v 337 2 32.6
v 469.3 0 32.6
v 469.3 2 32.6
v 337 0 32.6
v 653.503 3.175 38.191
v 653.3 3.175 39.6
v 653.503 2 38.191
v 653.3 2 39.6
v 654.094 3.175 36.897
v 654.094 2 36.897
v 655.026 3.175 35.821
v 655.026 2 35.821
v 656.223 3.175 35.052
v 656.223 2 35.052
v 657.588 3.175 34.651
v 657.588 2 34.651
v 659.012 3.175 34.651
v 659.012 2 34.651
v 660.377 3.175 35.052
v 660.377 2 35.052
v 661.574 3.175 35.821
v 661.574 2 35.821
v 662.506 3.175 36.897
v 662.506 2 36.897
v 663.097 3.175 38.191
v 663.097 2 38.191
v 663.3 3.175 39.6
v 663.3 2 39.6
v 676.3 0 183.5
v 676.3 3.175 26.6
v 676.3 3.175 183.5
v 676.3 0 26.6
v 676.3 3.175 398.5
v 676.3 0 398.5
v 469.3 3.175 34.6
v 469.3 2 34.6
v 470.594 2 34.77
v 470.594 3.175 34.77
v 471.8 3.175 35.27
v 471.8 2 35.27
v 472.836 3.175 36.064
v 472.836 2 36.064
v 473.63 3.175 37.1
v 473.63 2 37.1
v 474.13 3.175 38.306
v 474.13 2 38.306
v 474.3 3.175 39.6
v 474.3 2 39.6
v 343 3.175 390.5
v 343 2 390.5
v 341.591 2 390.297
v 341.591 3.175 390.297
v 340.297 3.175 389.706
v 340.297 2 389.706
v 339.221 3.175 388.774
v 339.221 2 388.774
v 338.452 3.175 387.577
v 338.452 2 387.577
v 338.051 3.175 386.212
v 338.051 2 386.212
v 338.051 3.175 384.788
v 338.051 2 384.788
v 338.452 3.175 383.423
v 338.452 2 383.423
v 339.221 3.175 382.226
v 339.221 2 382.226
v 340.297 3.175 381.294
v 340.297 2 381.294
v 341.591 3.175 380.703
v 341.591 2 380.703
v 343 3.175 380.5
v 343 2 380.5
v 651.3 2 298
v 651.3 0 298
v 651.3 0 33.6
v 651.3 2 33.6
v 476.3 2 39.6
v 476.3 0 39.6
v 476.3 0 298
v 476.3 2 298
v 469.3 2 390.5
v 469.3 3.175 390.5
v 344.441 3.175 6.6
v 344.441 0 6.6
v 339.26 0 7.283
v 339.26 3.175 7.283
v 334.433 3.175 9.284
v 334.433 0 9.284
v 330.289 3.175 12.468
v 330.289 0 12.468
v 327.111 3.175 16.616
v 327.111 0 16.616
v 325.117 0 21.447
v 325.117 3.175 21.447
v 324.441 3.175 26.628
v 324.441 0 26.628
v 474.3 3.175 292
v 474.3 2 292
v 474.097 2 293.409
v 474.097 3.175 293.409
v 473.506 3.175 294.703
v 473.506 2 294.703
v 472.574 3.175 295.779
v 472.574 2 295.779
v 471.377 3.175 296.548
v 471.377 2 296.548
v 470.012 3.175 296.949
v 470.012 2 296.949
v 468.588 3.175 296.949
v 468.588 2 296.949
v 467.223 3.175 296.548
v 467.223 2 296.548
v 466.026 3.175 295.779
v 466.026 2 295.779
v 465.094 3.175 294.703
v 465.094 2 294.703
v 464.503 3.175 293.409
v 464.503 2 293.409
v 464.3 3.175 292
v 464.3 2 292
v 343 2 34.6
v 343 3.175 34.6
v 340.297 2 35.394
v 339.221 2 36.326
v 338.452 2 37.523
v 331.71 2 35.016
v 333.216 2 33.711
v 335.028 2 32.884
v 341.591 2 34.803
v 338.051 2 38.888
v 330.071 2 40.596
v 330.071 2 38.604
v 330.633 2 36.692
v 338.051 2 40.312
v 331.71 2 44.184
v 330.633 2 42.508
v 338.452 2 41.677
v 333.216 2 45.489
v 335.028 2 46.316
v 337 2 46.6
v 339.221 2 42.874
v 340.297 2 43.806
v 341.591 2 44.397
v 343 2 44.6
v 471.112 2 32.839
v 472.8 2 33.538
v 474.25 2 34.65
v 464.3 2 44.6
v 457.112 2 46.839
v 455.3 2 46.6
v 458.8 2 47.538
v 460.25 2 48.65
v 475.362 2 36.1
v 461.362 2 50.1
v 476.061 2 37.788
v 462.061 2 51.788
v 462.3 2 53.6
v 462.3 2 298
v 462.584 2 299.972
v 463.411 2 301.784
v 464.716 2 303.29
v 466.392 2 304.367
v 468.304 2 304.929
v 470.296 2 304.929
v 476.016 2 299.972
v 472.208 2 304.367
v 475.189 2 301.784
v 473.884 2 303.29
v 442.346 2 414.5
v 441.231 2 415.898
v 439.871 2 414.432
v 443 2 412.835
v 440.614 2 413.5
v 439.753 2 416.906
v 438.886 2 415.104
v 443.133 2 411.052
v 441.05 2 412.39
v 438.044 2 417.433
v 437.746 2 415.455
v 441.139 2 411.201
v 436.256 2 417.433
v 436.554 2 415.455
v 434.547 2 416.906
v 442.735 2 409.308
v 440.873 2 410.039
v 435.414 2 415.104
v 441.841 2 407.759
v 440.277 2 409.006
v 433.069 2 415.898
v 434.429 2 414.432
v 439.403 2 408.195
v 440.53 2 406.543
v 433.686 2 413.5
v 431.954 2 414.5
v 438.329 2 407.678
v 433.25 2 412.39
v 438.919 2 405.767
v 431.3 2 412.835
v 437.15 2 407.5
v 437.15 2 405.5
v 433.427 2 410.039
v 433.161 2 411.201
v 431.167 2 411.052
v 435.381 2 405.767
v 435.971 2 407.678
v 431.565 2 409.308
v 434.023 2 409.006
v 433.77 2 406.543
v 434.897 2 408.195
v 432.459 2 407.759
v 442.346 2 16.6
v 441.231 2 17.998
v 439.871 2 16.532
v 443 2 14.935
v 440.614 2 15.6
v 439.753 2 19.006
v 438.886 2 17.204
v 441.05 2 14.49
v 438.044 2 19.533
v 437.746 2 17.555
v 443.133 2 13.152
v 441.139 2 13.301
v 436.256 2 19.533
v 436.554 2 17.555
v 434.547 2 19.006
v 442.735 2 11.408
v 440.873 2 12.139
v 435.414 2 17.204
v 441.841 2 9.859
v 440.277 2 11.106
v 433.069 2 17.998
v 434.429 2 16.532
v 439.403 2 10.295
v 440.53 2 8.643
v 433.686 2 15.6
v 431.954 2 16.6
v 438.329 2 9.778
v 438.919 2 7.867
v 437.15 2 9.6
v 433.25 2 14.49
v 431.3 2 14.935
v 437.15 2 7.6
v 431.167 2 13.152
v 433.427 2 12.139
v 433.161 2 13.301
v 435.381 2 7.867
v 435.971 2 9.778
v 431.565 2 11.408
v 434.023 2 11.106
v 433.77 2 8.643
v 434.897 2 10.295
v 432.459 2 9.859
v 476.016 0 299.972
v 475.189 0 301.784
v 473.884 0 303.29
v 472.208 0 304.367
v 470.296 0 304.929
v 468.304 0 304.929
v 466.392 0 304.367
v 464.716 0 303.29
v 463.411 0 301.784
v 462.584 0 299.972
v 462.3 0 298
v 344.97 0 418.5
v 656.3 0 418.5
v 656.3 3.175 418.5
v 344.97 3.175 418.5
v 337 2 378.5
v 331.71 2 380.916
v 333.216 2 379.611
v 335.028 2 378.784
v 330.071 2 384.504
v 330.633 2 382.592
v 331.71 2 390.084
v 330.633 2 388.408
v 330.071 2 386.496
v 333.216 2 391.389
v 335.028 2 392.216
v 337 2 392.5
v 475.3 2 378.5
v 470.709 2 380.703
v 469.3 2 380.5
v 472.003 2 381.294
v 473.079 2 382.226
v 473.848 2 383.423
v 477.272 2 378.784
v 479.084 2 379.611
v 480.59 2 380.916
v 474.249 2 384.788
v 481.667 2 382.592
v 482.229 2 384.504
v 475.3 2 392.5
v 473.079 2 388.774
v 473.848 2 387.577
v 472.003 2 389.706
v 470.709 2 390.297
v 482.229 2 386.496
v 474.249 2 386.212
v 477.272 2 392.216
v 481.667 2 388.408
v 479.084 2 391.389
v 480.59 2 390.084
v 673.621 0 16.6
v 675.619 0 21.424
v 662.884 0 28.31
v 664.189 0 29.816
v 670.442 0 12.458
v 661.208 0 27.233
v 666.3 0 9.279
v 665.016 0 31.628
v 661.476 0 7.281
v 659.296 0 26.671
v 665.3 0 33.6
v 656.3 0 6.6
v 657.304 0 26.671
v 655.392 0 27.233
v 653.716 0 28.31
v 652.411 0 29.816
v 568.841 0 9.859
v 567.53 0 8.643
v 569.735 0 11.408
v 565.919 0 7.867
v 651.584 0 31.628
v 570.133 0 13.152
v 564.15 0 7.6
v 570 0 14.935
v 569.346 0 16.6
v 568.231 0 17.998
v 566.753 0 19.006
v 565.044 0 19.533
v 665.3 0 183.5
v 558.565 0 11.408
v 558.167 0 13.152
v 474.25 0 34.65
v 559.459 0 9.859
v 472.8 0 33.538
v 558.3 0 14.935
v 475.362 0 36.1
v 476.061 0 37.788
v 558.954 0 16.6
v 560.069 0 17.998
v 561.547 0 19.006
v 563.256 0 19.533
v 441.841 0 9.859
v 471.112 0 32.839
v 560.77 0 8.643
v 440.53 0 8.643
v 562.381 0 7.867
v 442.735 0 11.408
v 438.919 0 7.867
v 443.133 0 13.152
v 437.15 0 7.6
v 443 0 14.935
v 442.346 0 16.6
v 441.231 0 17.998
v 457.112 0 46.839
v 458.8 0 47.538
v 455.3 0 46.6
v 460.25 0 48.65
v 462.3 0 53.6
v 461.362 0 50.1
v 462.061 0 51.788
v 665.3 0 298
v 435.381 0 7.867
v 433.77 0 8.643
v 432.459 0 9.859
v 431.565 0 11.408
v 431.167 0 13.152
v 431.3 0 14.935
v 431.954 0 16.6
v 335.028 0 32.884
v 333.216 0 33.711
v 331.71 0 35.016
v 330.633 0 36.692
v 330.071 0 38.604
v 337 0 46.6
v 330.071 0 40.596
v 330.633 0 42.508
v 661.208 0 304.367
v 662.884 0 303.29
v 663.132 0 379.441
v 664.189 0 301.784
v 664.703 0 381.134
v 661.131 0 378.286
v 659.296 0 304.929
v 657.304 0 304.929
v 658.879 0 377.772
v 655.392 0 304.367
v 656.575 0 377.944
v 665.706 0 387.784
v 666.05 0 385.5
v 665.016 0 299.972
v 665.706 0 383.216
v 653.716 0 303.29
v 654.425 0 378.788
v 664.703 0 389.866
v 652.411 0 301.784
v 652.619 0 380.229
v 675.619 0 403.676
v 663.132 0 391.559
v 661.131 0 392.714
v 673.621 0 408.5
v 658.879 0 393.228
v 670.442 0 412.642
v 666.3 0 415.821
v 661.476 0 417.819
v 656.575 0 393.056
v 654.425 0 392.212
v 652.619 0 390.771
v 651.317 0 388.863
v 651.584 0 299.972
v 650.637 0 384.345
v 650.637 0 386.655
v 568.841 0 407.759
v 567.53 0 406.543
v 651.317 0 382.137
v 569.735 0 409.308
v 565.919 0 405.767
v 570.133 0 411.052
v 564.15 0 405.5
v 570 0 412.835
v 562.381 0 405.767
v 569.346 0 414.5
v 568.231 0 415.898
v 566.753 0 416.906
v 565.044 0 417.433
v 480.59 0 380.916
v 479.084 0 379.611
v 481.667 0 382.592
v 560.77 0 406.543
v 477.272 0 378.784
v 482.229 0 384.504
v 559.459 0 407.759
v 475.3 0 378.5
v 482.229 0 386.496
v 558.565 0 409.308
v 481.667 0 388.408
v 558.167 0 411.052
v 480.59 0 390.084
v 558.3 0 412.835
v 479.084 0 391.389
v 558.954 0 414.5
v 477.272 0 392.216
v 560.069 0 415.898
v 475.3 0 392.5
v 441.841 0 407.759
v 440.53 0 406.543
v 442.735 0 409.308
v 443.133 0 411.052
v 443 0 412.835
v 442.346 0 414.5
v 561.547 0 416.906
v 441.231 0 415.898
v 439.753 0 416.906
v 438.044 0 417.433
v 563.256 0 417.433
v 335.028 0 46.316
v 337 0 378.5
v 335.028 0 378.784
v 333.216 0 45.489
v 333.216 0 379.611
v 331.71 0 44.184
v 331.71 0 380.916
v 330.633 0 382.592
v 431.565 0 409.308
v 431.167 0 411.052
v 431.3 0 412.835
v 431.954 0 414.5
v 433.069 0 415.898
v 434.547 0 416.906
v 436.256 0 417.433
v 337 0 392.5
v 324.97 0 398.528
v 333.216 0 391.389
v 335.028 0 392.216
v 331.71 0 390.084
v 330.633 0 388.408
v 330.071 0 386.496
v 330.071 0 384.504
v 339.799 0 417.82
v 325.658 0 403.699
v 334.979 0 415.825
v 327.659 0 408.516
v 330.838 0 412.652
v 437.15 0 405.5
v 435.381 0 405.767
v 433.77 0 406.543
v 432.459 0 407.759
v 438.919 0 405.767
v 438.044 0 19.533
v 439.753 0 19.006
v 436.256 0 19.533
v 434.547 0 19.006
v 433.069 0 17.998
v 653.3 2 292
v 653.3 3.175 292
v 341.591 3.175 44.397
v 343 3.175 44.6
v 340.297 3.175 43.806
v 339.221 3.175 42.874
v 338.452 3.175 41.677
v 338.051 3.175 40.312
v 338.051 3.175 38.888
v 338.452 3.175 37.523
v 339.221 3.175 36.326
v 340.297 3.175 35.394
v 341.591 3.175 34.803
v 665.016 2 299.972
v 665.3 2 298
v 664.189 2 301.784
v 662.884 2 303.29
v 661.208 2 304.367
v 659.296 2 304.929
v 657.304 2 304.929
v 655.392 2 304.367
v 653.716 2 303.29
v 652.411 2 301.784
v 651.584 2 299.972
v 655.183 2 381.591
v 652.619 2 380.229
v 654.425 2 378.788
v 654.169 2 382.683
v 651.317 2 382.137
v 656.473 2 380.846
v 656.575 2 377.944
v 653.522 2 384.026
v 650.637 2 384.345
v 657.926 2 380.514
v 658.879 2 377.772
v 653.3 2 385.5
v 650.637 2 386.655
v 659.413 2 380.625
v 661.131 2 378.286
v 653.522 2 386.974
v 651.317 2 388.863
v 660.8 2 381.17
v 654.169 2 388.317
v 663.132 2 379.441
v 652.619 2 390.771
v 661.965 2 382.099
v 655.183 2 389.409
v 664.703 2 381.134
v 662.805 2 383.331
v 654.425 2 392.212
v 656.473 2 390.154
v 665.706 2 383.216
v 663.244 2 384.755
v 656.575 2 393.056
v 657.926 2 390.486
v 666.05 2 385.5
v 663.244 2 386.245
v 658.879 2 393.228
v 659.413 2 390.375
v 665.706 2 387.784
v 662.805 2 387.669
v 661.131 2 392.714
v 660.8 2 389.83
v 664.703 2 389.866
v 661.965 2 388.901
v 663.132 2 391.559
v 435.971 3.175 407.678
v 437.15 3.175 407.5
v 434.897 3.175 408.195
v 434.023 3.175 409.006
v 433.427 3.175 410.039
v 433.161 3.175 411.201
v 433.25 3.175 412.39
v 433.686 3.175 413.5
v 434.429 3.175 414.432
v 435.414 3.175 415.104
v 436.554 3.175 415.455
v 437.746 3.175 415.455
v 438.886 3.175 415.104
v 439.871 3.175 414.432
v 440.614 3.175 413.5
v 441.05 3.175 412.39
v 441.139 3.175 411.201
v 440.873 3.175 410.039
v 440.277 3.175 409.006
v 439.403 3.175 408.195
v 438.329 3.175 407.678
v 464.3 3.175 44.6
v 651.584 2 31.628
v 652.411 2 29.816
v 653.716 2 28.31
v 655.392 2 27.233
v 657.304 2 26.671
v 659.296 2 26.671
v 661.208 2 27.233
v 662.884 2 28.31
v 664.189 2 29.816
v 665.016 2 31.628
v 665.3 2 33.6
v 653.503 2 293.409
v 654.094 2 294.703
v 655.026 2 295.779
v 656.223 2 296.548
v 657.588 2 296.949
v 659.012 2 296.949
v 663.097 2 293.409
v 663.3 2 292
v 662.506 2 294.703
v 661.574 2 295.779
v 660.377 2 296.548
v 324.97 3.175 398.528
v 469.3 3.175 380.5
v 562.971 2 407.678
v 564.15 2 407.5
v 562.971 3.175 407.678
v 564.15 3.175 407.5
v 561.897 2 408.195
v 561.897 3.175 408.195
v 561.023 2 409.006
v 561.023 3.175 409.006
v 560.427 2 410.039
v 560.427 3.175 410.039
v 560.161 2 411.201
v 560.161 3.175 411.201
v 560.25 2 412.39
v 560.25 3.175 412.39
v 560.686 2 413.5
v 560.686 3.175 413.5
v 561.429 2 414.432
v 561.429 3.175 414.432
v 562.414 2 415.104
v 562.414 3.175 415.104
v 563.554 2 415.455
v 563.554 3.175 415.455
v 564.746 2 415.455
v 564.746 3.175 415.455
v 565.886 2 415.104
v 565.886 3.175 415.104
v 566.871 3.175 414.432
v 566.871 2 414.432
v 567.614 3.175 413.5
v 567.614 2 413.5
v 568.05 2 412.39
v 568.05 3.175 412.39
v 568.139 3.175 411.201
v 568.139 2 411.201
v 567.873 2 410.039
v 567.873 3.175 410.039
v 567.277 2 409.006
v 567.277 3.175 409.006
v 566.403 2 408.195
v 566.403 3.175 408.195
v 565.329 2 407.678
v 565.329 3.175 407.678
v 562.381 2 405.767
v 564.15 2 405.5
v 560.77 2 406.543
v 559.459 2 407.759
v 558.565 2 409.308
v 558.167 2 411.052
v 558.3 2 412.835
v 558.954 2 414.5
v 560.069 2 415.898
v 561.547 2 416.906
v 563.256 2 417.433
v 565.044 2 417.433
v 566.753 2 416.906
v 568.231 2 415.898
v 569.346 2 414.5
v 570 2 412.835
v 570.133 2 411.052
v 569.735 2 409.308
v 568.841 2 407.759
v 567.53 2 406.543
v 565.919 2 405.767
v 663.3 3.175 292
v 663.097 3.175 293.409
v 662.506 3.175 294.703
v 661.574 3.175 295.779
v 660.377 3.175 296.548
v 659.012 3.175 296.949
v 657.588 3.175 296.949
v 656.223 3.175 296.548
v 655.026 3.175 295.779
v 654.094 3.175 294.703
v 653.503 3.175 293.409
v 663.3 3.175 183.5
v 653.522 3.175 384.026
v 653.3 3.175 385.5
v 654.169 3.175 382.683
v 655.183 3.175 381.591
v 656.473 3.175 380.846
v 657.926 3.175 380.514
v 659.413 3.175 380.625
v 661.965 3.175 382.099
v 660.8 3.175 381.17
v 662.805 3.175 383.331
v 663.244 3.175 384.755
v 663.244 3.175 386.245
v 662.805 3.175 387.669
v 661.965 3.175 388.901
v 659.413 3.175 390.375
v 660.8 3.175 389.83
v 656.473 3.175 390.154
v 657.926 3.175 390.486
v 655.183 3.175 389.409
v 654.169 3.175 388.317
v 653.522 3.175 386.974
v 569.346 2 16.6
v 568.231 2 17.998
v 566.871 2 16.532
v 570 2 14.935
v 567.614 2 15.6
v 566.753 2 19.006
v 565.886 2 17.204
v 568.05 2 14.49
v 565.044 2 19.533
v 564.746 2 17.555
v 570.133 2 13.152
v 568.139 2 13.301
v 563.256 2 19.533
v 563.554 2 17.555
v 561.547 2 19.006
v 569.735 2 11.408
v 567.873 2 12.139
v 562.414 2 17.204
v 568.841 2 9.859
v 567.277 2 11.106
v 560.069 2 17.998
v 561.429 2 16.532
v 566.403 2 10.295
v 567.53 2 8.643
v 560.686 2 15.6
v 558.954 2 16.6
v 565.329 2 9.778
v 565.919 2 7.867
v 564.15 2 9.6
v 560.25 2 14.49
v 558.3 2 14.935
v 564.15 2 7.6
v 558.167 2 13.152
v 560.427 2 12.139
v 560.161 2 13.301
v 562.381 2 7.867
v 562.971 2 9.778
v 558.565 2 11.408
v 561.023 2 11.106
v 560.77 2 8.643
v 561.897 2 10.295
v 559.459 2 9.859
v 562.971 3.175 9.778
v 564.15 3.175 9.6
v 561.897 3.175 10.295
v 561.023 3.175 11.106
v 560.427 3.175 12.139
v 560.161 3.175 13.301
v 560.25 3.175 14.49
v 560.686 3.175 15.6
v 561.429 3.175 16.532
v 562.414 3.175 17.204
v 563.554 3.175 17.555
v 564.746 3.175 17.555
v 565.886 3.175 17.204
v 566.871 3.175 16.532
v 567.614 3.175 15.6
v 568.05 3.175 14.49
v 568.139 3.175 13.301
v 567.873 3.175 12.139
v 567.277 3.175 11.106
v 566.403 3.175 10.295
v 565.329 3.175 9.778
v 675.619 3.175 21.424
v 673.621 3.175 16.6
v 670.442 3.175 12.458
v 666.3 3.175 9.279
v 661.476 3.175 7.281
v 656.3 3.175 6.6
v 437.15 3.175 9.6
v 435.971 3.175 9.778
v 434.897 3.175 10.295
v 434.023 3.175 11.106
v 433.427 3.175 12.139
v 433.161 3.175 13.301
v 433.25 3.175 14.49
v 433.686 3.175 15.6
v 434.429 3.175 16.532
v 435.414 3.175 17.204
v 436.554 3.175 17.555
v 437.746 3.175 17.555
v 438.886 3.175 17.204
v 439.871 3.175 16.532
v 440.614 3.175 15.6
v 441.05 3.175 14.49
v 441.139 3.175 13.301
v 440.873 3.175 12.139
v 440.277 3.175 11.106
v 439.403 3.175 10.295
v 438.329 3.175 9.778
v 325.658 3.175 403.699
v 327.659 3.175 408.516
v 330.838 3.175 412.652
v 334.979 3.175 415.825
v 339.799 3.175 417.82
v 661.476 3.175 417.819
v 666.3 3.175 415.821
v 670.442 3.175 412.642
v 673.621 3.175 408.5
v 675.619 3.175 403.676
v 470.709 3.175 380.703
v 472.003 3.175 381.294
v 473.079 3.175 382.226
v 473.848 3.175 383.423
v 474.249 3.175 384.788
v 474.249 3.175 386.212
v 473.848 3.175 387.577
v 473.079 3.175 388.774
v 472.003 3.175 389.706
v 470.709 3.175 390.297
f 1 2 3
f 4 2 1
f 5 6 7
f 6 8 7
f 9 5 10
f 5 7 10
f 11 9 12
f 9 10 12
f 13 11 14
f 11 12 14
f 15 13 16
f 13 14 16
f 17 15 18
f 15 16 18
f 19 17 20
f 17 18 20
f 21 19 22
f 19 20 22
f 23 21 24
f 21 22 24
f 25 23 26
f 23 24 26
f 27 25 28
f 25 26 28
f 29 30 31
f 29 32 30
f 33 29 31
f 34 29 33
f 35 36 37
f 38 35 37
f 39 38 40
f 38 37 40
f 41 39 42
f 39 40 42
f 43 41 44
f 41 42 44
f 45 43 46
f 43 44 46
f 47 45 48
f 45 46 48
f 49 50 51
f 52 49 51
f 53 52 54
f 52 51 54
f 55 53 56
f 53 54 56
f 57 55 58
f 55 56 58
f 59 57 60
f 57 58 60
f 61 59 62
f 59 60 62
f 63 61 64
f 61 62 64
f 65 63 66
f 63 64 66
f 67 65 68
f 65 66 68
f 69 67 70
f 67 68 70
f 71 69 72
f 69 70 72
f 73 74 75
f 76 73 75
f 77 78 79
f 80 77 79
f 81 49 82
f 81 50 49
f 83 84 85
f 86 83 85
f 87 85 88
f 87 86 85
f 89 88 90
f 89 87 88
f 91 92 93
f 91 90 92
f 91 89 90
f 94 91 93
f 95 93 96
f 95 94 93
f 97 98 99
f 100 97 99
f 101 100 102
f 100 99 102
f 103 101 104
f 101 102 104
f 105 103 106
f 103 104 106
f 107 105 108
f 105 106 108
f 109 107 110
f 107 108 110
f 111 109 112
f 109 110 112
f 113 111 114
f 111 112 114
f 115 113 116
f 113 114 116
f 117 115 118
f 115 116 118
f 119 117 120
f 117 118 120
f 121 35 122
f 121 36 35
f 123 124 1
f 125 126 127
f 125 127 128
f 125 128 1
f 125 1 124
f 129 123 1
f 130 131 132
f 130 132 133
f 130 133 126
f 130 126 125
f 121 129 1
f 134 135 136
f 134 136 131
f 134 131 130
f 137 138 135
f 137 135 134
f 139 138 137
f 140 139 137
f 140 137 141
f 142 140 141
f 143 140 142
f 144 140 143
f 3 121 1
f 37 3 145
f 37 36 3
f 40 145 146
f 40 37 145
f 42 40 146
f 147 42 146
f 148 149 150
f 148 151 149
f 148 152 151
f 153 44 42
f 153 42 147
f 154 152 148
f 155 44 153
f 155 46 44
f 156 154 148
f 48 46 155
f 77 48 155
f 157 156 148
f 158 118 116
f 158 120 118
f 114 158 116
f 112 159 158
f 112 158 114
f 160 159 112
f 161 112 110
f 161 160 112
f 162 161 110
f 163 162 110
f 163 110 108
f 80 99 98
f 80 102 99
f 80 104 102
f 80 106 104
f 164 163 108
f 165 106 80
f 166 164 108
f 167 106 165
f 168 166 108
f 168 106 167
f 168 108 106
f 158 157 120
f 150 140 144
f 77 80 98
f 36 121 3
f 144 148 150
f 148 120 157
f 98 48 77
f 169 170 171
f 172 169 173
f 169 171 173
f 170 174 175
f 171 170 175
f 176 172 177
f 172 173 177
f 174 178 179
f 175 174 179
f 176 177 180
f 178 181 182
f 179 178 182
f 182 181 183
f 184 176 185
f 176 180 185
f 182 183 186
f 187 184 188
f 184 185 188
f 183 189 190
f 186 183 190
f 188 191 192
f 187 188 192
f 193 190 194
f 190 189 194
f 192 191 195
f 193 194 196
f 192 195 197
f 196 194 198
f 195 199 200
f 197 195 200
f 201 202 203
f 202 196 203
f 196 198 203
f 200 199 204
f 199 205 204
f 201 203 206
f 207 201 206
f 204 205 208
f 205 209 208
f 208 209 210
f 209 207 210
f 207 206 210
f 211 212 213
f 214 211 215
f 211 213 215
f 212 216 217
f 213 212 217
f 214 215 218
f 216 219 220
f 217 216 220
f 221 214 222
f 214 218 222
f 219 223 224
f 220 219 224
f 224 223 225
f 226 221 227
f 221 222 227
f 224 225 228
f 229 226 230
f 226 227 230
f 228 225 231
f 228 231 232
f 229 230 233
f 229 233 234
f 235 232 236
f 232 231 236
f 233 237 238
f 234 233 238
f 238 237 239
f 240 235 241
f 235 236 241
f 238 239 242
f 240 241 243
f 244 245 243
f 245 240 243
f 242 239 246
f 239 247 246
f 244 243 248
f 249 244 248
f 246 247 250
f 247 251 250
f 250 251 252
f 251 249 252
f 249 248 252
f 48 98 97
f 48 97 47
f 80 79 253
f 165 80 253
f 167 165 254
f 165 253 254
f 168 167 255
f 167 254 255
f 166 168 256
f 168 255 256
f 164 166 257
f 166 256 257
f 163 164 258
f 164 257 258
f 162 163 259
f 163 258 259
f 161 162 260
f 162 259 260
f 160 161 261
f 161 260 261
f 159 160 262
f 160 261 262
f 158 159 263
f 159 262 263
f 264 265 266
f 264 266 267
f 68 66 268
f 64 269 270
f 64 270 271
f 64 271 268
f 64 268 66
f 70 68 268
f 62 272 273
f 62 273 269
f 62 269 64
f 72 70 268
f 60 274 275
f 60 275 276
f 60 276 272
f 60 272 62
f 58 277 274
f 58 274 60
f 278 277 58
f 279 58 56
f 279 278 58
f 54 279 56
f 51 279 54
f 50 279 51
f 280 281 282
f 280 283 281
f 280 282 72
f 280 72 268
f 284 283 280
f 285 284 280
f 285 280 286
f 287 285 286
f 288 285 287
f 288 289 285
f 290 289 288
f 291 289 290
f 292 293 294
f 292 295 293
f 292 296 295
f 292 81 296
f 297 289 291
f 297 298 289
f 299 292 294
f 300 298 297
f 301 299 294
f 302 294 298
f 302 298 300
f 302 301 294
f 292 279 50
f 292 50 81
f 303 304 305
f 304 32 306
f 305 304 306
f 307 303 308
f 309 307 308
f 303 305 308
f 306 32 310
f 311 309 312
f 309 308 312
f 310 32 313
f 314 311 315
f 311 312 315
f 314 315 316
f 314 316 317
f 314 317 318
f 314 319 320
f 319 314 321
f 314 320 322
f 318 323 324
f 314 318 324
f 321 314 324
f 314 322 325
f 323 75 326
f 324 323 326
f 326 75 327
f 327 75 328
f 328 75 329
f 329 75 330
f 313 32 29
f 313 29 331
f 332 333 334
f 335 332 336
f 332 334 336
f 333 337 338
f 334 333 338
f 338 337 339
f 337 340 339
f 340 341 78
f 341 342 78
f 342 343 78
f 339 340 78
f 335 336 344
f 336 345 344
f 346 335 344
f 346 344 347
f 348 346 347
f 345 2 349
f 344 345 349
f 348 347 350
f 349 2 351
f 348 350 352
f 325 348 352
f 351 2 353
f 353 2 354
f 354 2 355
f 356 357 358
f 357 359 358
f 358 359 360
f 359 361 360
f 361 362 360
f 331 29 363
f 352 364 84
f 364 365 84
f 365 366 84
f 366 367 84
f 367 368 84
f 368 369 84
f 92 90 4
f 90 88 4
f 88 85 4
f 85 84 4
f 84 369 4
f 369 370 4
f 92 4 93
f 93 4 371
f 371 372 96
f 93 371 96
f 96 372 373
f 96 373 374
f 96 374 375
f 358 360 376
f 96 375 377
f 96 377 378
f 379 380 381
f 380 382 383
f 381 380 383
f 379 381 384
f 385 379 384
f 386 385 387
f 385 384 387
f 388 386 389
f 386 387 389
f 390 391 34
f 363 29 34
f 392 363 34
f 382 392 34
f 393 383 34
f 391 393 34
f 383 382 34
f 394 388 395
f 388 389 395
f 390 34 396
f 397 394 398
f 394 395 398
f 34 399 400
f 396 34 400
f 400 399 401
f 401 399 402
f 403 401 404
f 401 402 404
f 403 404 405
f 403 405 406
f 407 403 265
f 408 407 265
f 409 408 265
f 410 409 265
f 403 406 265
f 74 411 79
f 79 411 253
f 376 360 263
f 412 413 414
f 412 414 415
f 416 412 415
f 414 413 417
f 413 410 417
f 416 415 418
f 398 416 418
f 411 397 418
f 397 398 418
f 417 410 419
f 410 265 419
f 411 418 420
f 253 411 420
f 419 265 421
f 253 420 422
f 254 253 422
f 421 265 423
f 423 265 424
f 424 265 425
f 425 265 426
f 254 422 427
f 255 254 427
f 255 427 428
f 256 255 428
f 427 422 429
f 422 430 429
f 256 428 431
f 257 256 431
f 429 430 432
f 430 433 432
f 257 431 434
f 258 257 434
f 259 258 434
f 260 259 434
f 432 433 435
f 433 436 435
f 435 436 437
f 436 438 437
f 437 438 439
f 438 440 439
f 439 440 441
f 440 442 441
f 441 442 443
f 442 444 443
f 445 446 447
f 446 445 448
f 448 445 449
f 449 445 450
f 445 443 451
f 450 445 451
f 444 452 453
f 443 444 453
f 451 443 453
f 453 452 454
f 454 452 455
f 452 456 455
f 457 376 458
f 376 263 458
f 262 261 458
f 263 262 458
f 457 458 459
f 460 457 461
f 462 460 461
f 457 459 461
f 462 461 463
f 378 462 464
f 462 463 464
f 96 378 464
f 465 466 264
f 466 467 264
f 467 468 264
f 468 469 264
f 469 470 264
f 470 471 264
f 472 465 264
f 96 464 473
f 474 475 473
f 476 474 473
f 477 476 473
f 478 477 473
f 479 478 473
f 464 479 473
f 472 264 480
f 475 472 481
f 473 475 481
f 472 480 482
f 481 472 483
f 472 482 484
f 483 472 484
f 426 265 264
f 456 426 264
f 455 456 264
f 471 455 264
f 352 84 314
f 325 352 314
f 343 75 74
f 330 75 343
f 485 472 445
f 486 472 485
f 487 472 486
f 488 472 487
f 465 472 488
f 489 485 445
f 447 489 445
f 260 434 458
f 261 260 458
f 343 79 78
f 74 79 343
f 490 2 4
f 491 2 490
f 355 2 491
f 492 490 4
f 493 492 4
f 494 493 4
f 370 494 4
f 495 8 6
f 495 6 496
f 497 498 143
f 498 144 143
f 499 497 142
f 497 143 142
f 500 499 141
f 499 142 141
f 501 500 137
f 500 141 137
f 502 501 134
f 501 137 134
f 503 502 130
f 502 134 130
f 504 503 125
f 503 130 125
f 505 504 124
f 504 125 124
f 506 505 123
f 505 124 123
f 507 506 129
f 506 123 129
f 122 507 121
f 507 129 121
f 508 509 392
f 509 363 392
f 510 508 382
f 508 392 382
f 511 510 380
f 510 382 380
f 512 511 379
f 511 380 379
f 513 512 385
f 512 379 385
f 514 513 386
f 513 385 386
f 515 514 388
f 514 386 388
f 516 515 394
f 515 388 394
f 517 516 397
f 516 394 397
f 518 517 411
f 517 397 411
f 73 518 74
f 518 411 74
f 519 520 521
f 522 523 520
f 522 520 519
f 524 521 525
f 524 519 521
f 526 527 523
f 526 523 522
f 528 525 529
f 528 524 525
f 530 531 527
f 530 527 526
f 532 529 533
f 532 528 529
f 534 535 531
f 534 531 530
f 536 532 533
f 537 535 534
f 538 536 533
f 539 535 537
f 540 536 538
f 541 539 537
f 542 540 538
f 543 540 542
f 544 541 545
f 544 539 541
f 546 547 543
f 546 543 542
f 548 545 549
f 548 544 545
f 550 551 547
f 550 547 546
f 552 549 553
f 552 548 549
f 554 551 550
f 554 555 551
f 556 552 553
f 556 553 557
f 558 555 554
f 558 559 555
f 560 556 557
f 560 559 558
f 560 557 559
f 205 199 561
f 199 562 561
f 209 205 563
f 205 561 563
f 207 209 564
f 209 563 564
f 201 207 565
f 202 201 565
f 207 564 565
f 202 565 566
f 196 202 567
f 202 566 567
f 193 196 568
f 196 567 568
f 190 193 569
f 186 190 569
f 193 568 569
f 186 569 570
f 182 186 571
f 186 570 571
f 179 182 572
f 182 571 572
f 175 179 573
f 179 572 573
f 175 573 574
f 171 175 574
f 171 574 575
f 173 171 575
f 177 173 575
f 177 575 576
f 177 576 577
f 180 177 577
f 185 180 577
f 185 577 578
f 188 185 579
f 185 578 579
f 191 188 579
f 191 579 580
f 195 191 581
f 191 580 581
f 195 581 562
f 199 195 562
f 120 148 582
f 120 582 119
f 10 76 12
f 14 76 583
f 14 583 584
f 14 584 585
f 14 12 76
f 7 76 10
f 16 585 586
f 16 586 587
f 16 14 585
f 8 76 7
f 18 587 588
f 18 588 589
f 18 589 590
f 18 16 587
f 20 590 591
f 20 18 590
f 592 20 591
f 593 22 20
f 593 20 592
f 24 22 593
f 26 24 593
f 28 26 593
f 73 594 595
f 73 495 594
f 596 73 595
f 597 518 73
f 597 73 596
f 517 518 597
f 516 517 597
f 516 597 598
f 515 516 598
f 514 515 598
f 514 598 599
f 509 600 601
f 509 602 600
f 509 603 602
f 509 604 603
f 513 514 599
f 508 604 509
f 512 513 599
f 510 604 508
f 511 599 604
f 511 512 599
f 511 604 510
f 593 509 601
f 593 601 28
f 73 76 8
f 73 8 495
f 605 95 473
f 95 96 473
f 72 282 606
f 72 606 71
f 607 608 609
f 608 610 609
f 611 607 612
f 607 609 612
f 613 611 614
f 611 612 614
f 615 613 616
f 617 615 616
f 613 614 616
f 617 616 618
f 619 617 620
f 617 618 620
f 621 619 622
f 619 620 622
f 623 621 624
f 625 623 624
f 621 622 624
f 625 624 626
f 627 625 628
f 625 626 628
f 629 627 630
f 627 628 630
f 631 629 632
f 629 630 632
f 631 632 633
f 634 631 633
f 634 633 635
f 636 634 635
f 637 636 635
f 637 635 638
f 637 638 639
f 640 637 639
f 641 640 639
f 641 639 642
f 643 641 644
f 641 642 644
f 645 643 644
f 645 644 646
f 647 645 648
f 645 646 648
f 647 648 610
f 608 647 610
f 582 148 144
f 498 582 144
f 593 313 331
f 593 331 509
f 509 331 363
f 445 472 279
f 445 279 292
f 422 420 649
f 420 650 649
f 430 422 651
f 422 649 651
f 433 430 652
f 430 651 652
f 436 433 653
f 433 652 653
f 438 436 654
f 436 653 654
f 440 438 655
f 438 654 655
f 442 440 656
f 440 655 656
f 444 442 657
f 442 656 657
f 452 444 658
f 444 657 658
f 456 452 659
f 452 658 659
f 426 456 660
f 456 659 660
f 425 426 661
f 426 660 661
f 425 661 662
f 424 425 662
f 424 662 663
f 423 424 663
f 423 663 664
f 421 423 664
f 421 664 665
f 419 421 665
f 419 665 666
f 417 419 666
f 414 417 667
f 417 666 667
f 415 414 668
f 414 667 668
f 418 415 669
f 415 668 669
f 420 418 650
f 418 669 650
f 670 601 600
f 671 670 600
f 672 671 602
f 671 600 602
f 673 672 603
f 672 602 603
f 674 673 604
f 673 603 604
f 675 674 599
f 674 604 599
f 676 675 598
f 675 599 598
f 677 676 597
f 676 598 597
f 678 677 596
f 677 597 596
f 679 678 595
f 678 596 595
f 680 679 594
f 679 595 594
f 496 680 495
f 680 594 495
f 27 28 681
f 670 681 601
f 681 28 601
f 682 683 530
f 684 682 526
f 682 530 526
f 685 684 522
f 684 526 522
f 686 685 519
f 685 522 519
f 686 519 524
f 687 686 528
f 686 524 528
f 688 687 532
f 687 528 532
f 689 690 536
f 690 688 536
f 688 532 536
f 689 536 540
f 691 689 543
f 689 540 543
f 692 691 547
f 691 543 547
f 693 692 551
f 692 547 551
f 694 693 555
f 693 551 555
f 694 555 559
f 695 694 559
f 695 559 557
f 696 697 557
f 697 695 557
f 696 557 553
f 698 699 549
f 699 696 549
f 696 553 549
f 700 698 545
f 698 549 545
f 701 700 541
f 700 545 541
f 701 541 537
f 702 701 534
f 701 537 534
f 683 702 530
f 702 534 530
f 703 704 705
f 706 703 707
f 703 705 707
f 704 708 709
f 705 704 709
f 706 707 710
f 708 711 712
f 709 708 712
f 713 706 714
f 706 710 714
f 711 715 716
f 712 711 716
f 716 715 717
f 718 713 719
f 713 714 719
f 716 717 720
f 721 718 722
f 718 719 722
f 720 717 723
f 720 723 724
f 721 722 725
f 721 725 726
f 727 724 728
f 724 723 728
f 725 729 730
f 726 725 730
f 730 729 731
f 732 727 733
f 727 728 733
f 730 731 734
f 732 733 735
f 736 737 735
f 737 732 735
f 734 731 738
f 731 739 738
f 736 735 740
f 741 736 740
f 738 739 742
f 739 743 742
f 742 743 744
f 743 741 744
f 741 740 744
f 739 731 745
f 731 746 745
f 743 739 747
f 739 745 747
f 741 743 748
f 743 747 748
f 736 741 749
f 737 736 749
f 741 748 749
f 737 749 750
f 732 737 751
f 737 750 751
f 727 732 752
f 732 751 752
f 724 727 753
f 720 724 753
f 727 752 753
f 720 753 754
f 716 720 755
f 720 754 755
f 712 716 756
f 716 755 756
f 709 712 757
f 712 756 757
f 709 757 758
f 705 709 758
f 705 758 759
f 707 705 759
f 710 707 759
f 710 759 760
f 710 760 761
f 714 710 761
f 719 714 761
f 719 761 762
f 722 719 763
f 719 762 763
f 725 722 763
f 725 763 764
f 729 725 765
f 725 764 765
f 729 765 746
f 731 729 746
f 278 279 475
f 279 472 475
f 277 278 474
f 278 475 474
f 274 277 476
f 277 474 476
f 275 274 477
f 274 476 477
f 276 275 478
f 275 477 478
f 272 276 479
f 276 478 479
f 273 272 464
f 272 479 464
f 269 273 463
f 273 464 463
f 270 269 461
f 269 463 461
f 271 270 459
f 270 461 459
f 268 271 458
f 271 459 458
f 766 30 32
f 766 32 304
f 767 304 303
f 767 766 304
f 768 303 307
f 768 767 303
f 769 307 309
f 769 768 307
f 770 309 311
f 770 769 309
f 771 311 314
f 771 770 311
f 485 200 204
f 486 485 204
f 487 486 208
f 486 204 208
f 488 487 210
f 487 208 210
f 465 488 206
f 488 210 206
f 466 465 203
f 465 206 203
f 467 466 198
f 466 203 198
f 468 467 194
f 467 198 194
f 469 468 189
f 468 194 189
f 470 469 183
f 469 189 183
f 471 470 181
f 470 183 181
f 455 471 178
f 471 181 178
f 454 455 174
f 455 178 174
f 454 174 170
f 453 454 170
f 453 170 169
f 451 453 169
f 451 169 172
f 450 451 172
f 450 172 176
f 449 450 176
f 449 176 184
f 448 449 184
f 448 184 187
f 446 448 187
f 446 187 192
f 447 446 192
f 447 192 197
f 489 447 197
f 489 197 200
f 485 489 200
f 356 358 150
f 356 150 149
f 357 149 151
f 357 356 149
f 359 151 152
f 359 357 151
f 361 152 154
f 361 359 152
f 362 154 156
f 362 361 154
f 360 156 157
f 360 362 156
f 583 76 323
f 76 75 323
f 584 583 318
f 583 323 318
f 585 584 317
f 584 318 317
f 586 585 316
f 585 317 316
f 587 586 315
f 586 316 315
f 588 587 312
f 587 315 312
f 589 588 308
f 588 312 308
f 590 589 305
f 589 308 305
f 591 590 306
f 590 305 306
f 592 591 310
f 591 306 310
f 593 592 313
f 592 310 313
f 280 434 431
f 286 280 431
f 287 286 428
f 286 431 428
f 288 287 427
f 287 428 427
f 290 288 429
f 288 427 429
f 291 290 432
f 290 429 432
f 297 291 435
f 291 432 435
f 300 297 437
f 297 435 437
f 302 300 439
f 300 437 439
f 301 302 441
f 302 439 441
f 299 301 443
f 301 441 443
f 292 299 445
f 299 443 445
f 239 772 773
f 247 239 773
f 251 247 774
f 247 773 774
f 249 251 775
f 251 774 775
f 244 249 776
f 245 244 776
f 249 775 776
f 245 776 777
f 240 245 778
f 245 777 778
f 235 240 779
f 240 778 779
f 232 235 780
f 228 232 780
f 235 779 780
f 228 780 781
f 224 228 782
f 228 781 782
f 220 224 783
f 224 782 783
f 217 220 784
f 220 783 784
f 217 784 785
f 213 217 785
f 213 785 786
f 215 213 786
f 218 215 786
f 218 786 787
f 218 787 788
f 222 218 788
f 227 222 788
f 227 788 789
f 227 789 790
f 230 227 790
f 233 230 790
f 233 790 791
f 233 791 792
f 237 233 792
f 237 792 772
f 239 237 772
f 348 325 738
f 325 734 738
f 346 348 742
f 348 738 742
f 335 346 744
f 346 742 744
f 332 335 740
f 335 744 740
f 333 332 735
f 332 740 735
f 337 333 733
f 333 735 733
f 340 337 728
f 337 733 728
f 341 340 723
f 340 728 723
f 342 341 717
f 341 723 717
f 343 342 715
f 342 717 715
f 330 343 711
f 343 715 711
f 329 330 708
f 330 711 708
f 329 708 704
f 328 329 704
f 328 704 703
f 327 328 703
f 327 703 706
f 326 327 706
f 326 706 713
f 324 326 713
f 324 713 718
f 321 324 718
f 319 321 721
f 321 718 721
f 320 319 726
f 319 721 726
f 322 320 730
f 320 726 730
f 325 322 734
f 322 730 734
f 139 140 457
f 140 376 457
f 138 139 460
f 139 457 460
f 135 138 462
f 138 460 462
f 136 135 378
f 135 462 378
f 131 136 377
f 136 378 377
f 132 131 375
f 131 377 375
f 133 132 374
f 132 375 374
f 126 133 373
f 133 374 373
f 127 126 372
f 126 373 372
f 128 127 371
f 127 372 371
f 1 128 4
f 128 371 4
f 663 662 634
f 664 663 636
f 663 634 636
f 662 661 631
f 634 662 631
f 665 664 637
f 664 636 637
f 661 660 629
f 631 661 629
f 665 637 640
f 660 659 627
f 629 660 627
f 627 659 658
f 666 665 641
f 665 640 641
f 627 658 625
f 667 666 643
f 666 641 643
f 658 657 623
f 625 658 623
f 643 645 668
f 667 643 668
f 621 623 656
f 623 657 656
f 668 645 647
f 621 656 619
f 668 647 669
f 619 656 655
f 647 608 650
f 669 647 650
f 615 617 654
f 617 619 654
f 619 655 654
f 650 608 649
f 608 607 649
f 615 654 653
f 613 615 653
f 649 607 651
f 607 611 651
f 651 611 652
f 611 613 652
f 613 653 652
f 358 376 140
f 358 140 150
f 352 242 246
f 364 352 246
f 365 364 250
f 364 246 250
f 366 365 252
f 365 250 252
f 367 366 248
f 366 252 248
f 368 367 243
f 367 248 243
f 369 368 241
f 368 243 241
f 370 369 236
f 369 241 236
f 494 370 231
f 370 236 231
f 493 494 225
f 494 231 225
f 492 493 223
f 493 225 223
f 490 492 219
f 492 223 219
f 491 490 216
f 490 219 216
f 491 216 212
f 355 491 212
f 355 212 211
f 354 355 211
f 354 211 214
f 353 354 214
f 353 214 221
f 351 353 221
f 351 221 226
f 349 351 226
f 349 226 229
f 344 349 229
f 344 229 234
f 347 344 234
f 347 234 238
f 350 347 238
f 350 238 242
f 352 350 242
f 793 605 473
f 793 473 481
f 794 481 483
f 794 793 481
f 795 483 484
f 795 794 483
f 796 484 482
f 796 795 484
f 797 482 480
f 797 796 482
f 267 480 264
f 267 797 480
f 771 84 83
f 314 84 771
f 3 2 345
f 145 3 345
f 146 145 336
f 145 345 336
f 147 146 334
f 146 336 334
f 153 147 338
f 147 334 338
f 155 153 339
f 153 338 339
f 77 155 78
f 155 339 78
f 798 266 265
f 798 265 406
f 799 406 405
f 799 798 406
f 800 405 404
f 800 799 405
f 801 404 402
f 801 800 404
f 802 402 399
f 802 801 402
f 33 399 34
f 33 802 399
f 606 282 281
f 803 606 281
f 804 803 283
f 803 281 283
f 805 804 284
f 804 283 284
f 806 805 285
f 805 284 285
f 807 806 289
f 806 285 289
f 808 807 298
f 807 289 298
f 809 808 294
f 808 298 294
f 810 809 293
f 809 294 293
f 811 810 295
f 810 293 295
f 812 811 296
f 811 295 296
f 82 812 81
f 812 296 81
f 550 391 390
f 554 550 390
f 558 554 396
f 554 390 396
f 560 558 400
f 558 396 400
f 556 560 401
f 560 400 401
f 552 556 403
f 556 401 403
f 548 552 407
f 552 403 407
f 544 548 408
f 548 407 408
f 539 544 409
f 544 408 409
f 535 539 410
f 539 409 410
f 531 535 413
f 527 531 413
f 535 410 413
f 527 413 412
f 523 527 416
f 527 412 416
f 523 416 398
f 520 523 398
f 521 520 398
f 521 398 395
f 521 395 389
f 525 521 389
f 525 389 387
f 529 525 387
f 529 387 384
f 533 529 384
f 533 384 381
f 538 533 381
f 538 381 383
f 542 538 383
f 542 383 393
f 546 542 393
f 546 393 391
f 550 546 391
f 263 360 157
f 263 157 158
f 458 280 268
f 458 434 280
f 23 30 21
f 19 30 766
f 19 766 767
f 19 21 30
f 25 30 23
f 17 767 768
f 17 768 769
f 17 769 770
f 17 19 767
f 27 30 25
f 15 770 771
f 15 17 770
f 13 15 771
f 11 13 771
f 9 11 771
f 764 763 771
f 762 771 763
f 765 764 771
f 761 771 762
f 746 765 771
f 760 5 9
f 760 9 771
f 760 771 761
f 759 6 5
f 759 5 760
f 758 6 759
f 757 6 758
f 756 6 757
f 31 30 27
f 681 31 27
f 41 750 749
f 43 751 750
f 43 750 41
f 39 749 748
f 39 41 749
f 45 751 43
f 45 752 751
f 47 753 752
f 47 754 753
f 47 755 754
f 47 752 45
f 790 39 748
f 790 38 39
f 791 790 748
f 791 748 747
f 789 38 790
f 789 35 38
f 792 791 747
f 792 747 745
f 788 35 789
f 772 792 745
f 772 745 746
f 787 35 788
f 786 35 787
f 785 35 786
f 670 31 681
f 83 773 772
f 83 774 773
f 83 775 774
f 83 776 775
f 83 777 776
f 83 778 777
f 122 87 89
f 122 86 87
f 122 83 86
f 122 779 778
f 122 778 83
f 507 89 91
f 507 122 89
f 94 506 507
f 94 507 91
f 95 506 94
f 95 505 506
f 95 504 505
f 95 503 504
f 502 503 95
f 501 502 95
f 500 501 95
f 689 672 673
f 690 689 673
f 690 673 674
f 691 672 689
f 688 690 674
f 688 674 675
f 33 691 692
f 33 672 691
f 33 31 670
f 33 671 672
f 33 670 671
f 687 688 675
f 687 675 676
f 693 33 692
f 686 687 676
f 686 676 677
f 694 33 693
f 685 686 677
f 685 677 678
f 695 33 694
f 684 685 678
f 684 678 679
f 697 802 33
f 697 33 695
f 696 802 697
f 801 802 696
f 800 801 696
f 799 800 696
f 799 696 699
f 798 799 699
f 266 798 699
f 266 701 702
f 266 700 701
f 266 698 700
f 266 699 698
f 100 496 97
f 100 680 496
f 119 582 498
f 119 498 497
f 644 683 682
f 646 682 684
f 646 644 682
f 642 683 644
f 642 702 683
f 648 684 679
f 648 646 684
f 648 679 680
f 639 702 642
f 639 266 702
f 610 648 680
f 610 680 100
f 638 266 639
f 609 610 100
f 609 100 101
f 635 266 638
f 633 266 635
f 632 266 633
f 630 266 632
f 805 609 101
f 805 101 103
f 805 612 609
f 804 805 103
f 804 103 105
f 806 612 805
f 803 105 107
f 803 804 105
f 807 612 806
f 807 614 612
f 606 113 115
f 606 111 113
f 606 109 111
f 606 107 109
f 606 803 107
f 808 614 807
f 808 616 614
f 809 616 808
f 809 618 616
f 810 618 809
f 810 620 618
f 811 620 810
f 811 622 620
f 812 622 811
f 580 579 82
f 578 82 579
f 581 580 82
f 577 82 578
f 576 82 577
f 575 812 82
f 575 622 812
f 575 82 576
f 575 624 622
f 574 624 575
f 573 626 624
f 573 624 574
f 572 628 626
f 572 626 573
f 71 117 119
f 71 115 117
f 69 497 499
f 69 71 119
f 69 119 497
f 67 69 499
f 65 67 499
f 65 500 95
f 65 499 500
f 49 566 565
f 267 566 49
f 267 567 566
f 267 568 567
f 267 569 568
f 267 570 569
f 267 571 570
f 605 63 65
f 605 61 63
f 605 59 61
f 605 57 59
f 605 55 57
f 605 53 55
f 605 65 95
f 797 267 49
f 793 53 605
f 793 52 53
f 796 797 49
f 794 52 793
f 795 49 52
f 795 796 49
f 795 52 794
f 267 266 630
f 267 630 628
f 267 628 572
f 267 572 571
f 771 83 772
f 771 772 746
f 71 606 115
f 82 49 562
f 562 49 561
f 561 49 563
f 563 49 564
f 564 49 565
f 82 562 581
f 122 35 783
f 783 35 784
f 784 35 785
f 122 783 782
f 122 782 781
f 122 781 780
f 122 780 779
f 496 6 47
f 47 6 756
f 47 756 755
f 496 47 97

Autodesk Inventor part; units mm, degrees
ref_plane "YZ Plane" through (0, 0, 0) normal (1, 0, 0) x (0, 1, 0)
ref_plane "XZ Plane" through (0, 0, 0) normal (0, 1, 0) x (-1, 0, 0)
ref_plane "XY Plane" through (0, 0, 0) normal (0, 0, 1) x (1, 0, 0)
sketch "Sketch1" plane through (0, 0, 0) normal (0, 1, 0) x (-1, 0, 0)
  line L0 (-613.8, 55) -> (-513.8, 55)
  line L1 (-387.5, 55) -> (-613.8, 55)
  line L2 (-513.8, 55) -> (-473.8, 55)
  line L3 (-469.3, 380.5) -> (-343, 380.5)
  line L4 (-343, 390.5) -> (-469.3, 390.5)
  line L5 (-474.3, 385.5) -> (-474.3, 385.5)
  circle A0 centre (-658.3, 385.5) radius 5
  arc A1 (-474.3, 385.5) -> (-469.3, 380.5) centre (-469.3, 385.5) ccw
  arc A2 (-469.3, 390.5) -> (-474.3, 385.5) centre (-469.3, 385.5) ccw
  line L6 (-513.8, 395) -> (-513.8, 395.5)
  line L7 (-513.8, 55) -> (-469.3, 55)
  line L8 (-474.3, 65) -> (-474.3, 65)
  line L9 (-474.3, 178.5) -> (-474.3, 178.5)
  line L10 (-474.3, 292) -> (-474.3, 292)
  line L11 (-653.3, 45) -> (-653.3, 272)
  line L12 (-663.3, 45) -> (-663.3, 272)
  line L13 (-613.8, 395.5) -> (-513.8, 395.5)
  line L14 (-513.8, 395.5) -> (-513.8, 168.5)
  line L15 (-513.8, 168.5) -> (-613.8, 168.5)
  line L16 (-513.8, 168.5) -> (-387.5, 168.5)
  line L17 (-613.8, 168.5) -> (-613.8, 395.5)
  line L18 (-513.8, 395.5) -> (-513.8, 29.6)
  line L19 (-613.8, 29.6) -> (-613.8, 168.5)
  line L20 (-387.5, 29.6) -> (-387.5, 395.5)
  line L21 (-387.5, 395.5) -> (-513.8, 395.5)
  line L22 (-387.5, 29.6) -> (-613.8, 29.6)
  line L23 (-513.8, 282) -> (-613.8, 282)
  line L24 (-663.3, 45) -> (-663.3, 39.6)
  line L25 (-653.3, 39.6) -> (-653.3, 45)
  arc A3 (-663.3, 39.6) -> (-653.3, 39.6) centre (-658.3, 39.6) ccw
  line L26 (-663.3, 272) -> (-663.3, 292)
  line L27 (-653.3, 292) -> (-653.3, 272)
  arc A4 (-653.3, 292) -> (-663.3, 292) centre (-658.3, 292) ccw
  line L28 (-464.3, 292) -> (-464.3, 183.5)
  line L29 (-474.3, 178.5) -> (-474.3, 292)
  arc A5 (-464.3, 292) -> (-474.3, 292) centre (-469.3, 292) ccw
  line L30 (-474.3, 183.5) -> (-474.3, 65)
  line L31 (-464.3, 70) -> (-464.3, 292)
  arc A6 (-343, 34.6) -> (-343, 44.6) centre (-343, 39.6) ccw
  line L32 (-343, 34.6) -> (-369.3, 34.6)
  line L33 (-364.3, 44.6) -> (-343, 44.6)
  line L34 (-369.3, 34.6) -> (-364.3, 34.6)
  line L35 (-663.3, 183.5) -> (-676.3, 183.5)
  line L36 (-676.3, 6.6) -> (-676.3, 418.5)
  line L37 (-324.4347, 22.1004) -> (-324.4347, 40.1004)
  line L38 (-324.4127, 6.6) -> (-324.9989, 418.5)
  arc A7 (-343, 380.5) -> (-343, 390.5) centre (-343, 385.5) ccw
  line L39 (-613.8, 55) -> (-613.8, 395.5)
  line L40 (-474.3, 65) -> (-474.3, 39.6)
  line L41 (-469.3, 34.6) -> (-369.3, 34.6)
  line L42 (-464.3, 70) -> (-464.3, 44.6)
  line L43 (-464.3, 44.6) -> (-364.3, 44.6)
  arc A8 (-474.3, 39.6) -> (-469.3, 34.6) centre (-469.3, 39.6) ccw
  line L44 (-437.15, 411.5) -> (-564.15, 411.5)
  line L45 (-437.15, 13.6) -> (-564.15, 13.6)
  line L46 (-324.4127, 6.6) -> (-676.3, 6.6)
  line L47 (-676.3, 418.5) -> (-324.9989, 418.5)
  point P0 (-469.3, 178.5)
  point P1 (-469.3, 292)
  point P2 (-474.3, 385.5)
  dimension "d9" = 10
  dimension "d75" = 126.3
  dimension "d76" = 226.3
  dimension "d78" = 10
  dimension "d79" = 10
  dimension "d82" = 10
  dimension "d92" = 10
  dimension "d98" = 13
  dimension "d205" = 365.9
  dimension "d206" = 227
  dimension "d207" = 340.5
  dimension "d208" = 5
  dimension "d238" = 127
  dimension "d240" = 127
extrude "Extrusion1" add sketch "Sketch1" along normal blind 3.175 contours L19 L15 L18 L0 | L0 L18 L22 L19 | L18 L16 L30 L40 L1 | L1 L40 A8 L41 L20 L22 L18 | L17 L23 L14 L15 | L14 L6 L21 L20 L4 A2 A1 L3 L16 L31 L28 A5 L29 L30 | L17 L13 L6 L14 L23 | L16 L20 L1 L42 L31 | L1 L20 L43 L42 | L36 L47 L38 L46
sketch "Sketch2" plane through (0, 0, 0) normal (0, -1, 0) x (1, 0, 0)
  line L0 (474.3, 178.5) -> (474.3, 178.5)
  line L1 (513.8, 168.5) -> (413.8, 168.5)
  line L2 (413.8, 395.5) -> (413.8, 55)
  line L3 (513.8, 395.5) -> (513.8, 29.6)
  line L4 (387.5, 29.6) -> (387.5, 395.5)
  line L5 (474.3, 65) -> (474.3, 65)
  line L6 (474.3, 385.5) -> (474.3, 385.5)
  line L7 (513.8, 395) -> (513.8, 395.5)
  line L8 (613.8, 29.6) -> (613.8, 168.5)
  line L9 (613.8, 55) -> (513.8, 55)
  line L10 (513.8, 55) -> (473.8, 55)
  line L11 (513.8, 55) -> (469.3, 55)
  line L12 (413.8, 55) -> (613.8, 55)
  line L13 (613.8, 168.5) -> (613.8, 395.5)
  line L14 (513.8, 395.5) -> (513.8, 168.5)
  line L15 (513.8, 168.5) -> (613.8, 168.5)
  line L16 (474.3, 292) -> (474.3, 292)
  line L17 (387.5, 29.6) -> (613.8, 29.6)
  line L18 (513.8, 282) -> (613.8, 282)
  line L19 (387.5, 395.5) -> (513.8, 395.5)
  line L20 (613.8, 395.5) -> (513.8, 395.5)
  line L21 (475.3, 378.5) -> (337, 378.5)
  line L22 (337, 392.5) -> (475.3, 392.5)
  circle A0 centre (658.3, 385.5) radius 7.75
  line L23 (665.3, 272) -> (665.3, 298)
  line L24 (651.3, 298) -> (651.3, 272)
  line L25 (651.3, 272) -> (651.3, 45)
  line L26 (651.3, 45) -> (651.3, 33.6)
  line L27 (665.3, 33.6) -> (665.3, 45)
  line L28 (665.3, 45) -> (665.3, 272)
  line L29 (369.3, 32.6) -> (337, 32.6)
  line L30 (337, 46.6) -> (355.3, 46.6)
  line L31 (462.3, 79) -> (462.3, 164.5)
  line L32 (462.3, 192.5) -> (462.3, 298)
  line L33 (476.3, 65) -> (476.3, 183.5)
  line L34 (476.3, 178.5) -> (476.3, 298)
  arc A1 (476.3, 298) -> (462.3, 298) centre (469.3, 298) ccw
  arc A2 (337, 46.6) -> (337, 32.6) centre (337, 39.6) ccw
  arc A3 (651.3, 33.6) -> (665.3, 33.6) centre (658.3, 33.6) ccw
  arc A4 (665.3, 298) -> (651.3, 298) centre (658.3, 298) ccw
  arc A5 (475.3, 378.5) -> (475.3, 392.5) centre (475.3, 385.5) ccw
  arc A6 (337, 392.5) -> (337, 378.5) centre (337, 385.5) ccw
  line L35 (476.3, 65) -> (476.3, 39.6)
  line L36 (469.3, 32.6) -> (369.3, 32.6)
  line L37 (343, 34.6) -> (469.3, 34.6) projected
  line L38 (462.3, 79) -> (462.3, 53.6)
  line L39 (464.3, 44.6) -> (343, 44.6) projected
  line L40 (455.3, 46.6) -> (355.3, 46.6)
  arc A7 (469.3, 32.6) -> (476.3, 39.6) centre (469.3, 39.6) ccw
  arc A8 (455.3, 46.6) -> (462.3, 53.6) centre (455.3, 53.6) ccw
  line L41 (462.3, 164.5) -> (462.3, 192.5)
  line L42 (464.3, 292) -> (464.3, 44.6) projected
  line L43 (676.3, 11.6) -> (324.4127, 11.6) projected
  line L44 (324.4127, 6.6) -> (324.9989, 418.5) projected
  line L45 (325, 413.5) -> (676.3, 413.5) projected
  line L46 (676.3, 418.5) -> (676.3, 6.6) projected
  point P0 (650, 0)
  point P1 (0, 41.6)
  point P2 (0, 378.5)
  point P3 (413.8, 282)
  point P4 (469.3, 178.5)
  point P5 (676.3, 450)
  point P6 (676.3, 0)
  point P7 (513.8, 55)
  point P8 (513.8, 29.6)
  point P9 (362.3, 46.6)
  point P10 (462.3, 72)
  point P11 (462.3, 171.5)
  point P12 (462.3, 185.5)
  point P13 (376.3, 58)
  point P14 (325, 424)
  point P15 (324.9989, 418.5)
  dimension "d178" = 15.5
  dimension "d186" = 14
  dimension "d190" = 14
  dimension "d192" = 14
  dimension "d194" = 14
  dimension "d198" = 14
  dimension "d202" = 14
  dimension "d209" = 7
extrude "Extrusion2" cut sketch "Sketch2" against normal blind 2 contours L33 L35 L10 L11 L12 L42 L1 | L1 L41 L32 A1 L34 L33 | L42 L12 L38 L31 L41 L1 | L35 A7 L36 L4 L39 L42 L12 L11 L10 | L42 L39 L4 L40 A8 L38 L12 | L36 L29 A2 L30 L40 L4 | L21 L4 L22 L2 | L2 L22 A5 L21 | L21 A6 L22 L4 | A0 | L28 L27 A3 L26 L25 L24 A4 L23
fillet "Fillet1" radius 20 4 edges at (324.4127, 1.5875, 6.6) (676.3, 1.5875, 6.6) (676.3, 1.5875, 418.5) (324.9989, 1.5875, 418.5)
hole "Hole2" at (437.15, 0, 13.6) at (564.15, 0, 13.6) at (437.15, 0, 411.5) at (564.15, 0, 411.5) direction (0, 1, 0) diameter 8 end through all counterbore diameter 12 counterbore depth 2
properties part number "PlateLateral" material "Aluminum, Anodized Silver"
